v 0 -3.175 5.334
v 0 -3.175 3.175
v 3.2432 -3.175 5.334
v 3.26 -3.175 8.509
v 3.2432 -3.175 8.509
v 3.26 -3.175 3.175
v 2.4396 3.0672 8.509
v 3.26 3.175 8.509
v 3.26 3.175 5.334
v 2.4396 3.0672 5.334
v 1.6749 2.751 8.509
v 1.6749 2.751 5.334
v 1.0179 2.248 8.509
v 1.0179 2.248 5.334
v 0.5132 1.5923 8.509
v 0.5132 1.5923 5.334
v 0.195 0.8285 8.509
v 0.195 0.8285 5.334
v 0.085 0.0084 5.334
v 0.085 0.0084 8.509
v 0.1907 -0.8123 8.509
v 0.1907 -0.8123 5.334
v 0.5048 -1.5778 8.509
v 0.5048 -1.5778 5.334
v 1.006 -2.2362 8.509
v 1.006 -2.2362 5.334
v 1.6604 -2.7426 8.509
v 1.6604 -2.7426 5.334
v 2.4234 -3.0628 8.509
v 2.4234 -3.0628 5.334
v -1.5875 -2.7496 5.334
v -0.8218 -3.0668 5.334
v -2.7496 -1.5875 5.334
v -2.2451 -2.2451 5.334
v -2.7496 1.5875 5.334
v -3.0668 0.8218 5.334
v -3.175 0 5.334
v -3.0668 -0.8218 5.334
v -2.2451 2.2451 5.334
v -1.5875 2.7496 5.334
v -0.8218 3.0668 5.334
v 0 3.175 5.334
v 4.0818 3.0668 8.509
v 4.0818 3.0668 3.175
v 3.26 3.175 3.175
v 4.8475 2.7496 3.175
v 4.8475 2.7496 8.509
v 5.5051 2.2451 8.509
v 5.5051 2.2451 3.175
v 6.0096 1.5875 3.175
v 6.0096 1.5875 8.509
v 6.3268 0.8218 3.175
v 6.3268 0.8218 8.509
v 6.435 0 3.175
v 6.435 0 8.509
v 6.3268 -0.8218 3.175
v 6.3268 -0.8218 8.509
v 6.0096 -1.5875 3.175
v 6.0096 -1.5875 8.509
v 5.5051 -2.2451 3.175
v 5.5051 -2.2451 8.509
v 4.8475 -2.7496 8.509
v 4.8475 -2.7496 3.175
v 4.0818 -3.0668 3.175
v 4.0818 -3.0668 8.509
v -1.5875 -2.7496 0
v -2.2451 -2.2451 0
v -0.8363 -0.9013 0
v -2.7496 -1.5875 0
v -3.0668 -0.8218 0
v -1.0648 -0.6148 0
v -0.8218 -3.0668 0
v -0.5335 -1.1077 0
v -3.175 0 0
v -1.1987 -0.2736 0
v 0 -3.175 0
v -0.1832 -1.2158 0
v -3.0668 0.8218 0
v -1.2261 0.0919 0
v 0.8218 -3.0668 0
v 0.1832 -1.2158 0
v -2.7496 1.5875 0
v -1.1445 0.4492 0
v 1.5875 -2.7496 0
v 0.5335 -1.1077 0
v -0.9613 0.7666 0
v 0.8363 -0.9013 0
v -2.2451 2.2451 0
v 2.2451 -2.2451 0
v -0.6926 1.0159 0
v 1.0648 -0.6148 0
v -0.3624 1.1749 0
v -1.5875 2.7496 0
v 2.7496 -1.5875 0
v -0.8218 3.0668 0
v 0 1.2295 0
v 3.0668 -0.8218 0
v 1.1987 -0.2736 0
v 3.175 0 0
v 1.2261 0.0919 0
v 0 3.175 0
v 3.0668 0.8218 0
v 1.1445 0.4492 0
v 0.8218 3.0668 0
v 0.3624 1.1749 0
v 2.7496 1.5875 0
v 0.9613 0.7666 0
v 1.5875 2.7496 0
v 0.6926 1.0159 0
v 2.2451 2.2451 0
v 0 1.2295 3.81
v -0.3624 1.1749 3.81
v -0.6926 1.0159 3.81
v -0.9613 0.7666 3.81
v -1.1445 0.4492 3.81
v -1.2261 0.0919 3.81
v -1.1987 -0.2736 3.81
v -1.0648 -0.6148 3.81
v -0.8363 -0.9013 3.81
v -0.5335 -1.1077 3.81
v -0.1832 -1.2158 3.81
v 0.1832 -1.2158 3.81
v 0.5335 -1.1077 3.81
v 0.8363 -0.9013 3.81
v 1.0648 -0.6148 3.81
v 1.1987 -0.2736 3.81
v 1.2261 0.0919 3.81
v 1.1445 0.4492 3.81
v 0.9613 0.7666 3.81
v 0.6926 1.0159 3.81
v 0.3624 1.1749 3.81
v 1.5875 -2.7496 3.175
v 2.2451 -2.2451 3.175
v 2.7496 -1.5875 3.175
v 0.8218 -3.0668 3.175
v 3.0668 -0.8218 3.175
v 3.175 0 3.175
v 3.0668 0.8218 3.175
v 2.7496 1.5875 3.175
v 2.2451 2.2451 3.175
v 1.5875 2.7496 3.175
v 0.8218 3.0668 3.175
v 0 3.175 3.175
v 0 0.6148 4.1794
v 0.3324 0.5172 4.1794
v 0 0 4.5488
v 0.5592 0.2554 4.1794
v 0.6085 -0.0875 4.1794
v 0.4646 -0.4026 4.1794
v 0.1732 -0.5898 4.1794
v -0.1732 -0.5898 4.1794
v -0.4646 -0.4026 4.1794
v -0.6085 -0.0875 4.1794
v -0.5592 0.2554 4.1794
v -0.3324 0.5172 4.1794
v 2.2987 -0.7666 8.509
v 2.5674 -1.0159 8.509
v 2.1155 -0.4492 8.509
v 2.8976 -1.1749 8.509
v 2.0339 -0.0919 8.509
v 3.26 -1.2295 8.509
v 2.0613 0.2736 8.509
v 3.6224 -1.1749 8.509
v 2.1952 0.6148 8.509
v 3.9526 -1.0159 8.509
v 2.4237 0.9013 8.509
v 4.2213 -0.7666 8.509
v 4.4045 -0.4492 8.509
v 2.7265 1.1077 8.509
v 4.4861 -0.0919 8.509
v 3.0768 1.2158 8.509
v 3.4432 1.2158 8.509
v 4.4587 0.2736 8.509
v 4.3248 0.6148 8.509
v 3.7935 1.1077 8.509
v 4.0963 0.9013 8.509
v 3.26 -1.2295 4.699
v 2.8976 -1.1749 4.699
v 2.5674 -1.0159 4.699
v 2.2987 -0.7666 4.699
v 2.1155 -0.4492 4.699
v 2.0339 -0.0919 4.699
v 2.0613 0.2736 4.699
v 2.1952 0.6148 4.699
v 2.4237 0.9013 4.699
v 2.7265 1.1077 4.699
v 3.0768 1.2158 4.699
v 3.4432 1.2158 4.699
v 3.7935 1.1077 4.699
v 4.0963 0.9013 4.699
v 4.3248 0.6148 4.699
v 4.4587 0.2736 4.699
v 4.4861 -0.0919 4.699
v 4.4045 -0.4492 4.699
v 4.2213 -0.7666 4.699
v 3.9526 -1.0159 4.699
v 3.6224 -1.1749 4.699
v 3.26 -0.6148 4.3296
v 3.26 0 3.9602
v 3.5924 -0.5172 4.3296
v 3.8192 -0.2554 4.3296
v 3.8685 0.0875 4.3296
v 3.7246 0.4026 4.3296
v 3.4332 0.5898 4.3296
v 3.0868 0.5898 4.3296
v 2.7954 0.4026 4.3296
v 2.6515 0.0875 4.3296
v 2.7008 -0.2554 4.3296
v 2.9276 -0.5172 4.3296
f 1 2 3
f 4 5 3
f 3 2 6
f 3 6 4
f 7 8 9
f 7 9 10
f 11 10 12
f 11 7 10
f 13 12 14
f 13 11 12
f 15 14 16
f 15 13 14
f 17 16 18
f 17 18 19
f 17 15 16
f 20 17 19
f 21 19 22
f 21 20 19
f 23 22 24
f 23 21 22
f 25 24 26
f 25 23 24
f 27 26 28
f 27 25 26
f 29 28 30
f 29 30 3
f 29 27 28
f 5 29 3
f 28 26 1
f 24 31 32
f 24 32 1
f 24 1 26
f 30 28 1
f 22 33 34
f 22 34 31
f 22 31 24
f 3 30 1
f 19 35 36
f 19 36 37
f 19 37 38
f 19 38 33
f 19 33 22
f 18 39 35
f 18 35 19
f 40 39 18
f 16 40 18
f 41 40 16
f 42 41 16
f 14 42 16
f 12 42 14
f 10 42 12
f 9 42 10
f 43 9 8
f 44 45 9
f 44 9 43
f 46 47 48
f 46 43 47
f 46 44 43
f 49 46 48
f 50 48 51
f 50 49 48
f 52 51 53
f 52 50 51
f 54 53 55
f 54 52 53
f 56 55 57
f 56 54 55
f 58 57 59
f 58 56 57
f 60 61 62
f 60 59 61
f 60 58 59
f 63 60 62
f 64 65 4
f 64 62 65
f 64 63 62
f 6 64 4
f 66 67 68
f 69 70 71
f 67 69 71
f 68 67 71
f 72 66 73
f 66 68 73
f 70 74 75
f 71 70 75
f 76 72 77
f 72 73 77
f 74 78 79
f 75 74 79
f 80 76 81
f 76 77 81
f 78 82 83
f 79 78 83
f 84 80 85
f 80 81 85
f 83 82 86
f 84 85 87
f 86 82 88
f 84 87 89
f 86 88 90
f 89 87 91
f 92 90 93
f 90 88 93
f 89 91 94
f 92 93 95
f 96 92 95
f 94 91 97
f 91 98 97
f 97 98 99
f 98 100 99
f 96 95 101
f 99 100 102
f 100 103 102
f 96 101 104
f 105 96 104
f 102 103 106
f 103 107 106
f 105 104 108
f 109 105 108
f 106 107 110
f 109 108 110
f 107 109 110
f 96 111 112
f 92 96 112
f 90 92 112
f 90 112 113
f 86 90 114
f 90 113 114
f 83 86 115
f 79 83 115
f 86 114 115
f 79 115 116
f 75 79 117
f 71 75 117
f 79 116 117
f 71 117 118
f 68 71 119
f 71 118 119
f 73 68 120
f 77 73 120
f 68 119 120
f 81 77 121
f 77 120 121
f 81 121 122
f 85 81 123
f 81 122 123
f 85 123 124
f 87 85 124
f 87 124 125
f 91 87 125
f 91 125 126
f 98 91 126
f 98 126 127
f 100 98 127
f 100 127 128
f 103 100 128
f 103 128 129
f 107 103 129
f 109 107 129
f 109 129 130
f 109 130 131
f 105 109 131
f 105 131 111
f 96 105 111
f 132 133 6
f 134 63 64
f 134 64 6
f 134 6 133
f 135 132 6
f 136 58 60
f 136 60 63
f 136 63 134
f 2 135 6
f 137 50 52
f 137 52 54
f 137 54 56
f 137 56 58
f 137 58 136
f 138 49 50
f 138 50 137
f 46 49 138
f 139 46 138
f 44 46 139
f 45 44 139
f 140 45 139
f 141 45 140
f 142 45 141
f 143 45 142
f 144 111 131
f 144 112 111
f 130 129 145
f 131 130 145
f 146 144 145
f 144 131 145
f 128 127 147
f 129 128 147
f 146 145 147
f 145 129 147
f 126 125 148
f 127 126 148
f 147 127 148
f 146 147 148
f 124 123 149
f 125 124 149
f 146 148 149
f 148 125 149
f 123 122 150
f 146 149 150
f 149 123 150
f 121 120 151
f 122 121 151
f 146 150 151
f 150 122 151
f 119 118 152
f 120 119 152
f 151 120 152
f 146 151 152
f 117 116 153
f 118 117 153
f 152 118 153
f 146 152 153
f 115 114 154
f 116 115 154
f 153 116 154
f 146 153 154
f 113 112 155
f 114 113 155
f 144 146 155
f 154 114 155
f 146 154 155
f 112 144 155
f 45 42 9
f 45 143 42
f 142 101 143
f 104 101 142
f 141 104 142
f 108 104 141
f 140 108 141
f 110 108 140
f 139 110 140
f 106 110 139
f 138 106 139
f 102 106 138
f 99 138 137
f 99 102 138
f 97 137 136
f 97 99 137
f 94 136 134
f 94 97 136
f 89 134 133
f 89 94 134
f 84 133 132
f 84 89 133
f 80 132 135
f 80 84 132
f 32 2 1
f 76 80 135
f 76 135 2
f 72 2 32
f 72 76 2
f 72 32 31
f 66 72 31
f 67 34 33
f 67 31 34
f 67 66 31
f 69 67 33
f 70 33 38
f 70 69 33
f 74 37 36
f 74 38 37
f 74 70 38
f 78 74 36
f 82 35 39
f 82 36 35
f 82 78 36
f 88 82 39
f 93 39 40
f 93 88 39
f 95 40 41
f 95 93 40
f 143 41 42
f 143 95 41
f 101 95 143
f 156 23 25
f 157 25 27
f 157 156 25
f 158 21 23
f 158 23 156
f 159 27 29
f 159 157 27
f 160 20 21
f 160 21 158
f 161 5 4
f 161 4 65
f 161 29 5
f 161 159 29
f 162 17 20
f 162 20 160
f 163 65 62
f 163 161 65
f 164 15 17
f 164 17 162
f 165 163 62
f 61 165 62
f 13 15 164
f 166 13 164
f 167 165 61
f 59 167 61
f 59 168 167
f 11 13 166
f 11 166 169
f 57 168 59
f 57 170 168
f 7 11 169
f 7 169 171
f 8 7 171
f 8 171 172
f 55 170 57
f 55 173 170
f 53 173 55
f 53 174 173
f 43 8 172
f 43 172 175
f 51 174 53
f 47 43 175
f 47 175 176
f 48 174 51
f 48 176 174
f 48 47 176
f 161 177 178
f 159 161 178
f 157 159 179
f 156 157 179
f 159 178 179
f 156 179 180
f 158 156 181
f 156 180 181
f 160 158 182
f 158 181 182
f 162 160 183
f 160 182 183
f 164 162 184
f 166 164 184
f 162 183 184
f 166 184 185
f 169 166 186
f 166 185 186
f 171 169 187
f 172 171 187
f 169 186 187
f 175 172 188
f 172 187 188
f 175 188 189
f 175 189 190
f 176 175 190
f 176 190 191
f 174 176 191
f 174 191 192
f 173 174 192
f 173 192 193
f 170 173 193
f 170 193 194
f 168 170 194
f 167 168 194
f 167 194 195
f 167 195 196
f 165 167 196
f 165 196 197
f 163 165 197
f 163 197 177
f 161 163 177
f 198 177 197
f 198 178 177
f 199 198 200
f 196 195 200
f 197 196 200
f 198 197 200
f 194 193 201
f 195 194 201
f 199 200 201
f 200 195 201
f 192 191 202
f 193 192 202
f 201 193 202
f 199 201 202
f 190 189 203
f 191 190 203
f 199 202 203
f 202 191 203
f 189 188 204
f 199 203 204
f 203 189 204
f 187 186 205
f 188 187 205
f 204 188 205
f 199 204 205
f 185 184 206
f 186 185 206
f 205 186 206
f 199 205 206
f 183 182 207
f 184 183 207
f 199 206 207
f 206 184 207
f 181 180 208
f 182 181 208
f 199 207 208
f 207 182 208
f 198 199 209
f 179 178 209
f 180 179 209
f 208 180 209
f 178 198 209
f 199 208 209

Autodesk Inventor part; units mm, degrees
ref_plane "YZ Plane" through (0, 0, 0) normal (1, 0, 0) x (0, 1, 0)
ref_plane "XZ Plane" through (0, 0, 0) normal (0, 1, 0) x (-1, 0, 0)
ref_plane "XY Plane" through (0, 0, 0) normal (0, 0, 1) x (1, 0, 0)
sketch "Sketch2" plane through (0, 0, 0) normal (0, 0, 1) x (1, 0, 0)
  arc A0 (3.26, -3.175) -> (3.26, 3.175) centre (3.26, 0) ccw
  arc A1 (0, 3.175) -> (0, -3.175) centre (0, 0) ccw
  line L0 (0, 3.175) -> (3.26, 3.175)
  line L1 (0, -3.175) -> (3.26, -3.175)
  dimension "d14" = 6.35
  dimension "d15" = 6.35
  dimension "d16" = 0
  dimension "d17" = 0
  dimension "d18" = 3.26
  dimension "d19" = 0
extrude "Extrusion2" add sketch "Sketch2" along normal blind 8.509
sketch "Sketch3" plane through (0, 0, 8.509) normal (0, 0, 1) x (1, 0, 0)
  point P0 (0, 0)
  point P1 (3.26, 0)
  dimension "d22" = 3.26
  dimension "d23" = 0
hole "Hole1" at (3.26, 0, 8.509) direction (0, 0, -1) diameter 2.459 depth 3.81 tip angle 118 thread size "M3x0.5" class "6H" standard "ISO Metric profile"
sketch "Sketch4" plane through (0, 0, 0) normal (0, 0, -1) x (-1, 0, 0)
  point P0 (0, 0)
hole "Hole2" at (0, 0, 0) direction (0, 0, 1) diameter 2.459 depth 3.81 tip angle 118 thread size "M3x0.5" class "6H" standard "ISO Metric profile"
sketch "Sketch5" plane through (0, 0, 0) normal (0, 0, -1) x (-1, 0, 0)
  arc A0 (-3.26, 3.175) -> (-3.26, -3.175) centre (-3.26, 0) ccw
  arc A1 (0, 3.175) -> (0, -3.175) centre (0, 0) ccw
  line L0 (0, 3.175) -> (-3.26, 3.175)
  arc A2 (0, -3.175) -> (0, 3.175) centre (0, 0) ccw projected
  line L1 (0, -3.175) -> (-3.26, -3.175)
  dimension "d42" = 3.26
extrude "Extrusion3" cut sketch "Sketch5" against normal blind 3.175 from surface at 0 contours L0 A1 L1 A0
sketch "Sketch6" plane through (0, 0, 8.509) normal (0, 0, 1) x (1, 0, 0)
  arc A0 (3.26, 3.175) -> (3.2432, -3.175) centre (3.26, 0) ccw
  line L0 (3.26, 3.175) -> (0, 3.175)
  line L1 (0, -3.175) -> (3.26, -3.175) projected
  line L2 (3.2432, -3.175) -> (0, -3.175)
  arc A1 (0, 3.175) -> (0, -3.175) centre (0, 0) ccw
  point P0 (3.268, -3.175)
  dimension "d43" = 3.26
extrude "Extrusion4" cut sketch "Sketch6" against normal blind 3.175
properties part number "PC104_EM-113 standoff_3.268" material "Aluminum 6061"
